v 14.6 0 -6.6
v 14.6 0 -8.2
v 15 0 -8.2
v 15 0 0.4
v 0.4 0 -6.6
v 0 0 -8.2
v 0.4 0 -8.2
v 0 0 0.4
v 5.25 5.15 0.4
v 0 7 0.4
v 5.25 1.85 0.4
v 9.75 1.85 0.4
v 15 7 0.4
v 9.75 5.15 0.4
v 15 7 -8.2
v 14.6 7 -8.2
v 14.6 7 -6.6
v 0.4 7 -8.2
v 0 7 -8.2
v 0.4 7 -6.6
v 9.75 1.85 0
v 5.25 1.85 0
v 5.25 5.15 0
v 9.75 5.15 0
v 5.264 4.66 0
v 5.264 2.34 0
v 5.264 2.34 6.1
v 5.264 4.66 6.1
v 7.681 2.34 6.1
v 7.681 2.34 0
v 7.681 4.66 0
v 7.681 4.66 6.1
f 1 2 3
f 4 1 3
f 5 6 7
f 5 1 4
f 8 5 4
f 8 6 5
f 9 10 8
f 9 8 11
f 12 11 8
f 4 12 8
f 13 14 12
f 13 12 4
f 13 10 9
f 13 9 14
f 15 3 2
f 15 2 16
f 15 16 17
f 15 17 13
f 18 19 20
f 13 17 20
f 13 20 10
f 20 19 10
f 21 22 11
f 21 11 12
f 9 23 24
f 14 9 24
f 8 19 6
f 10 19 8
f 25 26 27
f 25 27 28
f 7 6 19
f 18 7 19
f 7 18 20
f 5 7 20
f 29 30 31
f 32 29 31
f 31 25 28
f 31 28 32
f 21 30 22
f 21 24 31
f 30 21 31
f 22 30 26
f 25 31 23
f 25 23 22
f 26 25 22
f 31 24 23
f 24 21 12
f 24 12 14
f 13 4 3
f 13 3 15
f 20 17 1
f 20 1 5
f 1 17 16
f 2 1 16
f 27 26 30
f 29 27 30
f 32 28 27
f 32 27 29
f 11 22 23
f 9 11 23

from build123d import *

# Parameters (mm, degrees)
SKETCH_1_W      = 15
SKETCH_1_H      = 7
SKETCH_1_W_2    = 4.5
SKETCH_1_H_2    = 3.3
EXTRUDE_1_DEPTH = 0.4
SKETCH_2_W      = 15
SKETCH_2_H      = 7
EXTRUDE_2_DEPTH = 6.6
SKETCH_3_W      = 8.6
SKETCH_3_H      = 7
EXTRUDE_3_DEPTH = 0.4
SKETCH_4_W      = 8.6
SKETCH_4_H      = 7
EXTRUDE_4_DEPTH = 0.4
SKETCH_5_W      = 2.417347104
SKETCH_5_H      = 2.320372832
EXTRUDE_5_DEPTH = 6.1


with BuildPart() as part:
    # Эскиз1 → Бобышка-Вытянуть1 (new body)
    with BuildSketch(Plane.XY):
        with Locations((7.5, 3.5)):
            Rectangle(SKETCH_1_W, SKETCH_1_H)
        with Locations((7.5, 3.5)):
            Rectangle(SKETCH_1_W_2, SKETCH_1_H_2, mode=Mode.SUBTRACT)
    extrude(amount=EXTRUDE_1_DEPTH)

    # Эскиз2 → Бобышка-Вытянуть2 (add)
    with BuildSketch(Plane(origin=(0, 0, 0), x_dir=(-1, 0, 0), z_dir=(0, 0, -1))):
        with Locations((-7.5, 3.5)):
            Rectangle(SKETCH_2_W, SKETCH_2_H)
    extrude(amount=EXTRUDE_2_DEPTH)

    # Эскиз3 → Бобышка-Вытянуть3 (add)
    with BuildSketch(Plane(origin=(15, 0, 0), x_dir=(0, 0, -1), z_dir=(1, 0, 0))):
        with Locations((3.9, 3.5)):
            Rectangle(SKETCH_3_W, SKETCH_3_H)
    extrude(amount=-EXTRUDE_3_DEPTH)

    # Эскиз4 → Бобышка-Вытянуть4 (add)
    with BuildSketch(Plane.ZY):
        with Locations((-3.9, 3.5)):
            Rectangle(SKETCH_4_W, SKETCH_4_H)
    extrude(amount=-EXTRUDE_4_DEPTH)

    # Эскиз5 → Бобышка-Вытянуть5 (add)
    with BuildSketch(Plane.XY):
        with Locations((6.472493098, 3.5)):
            Rectangle(SKETCH_5_W, SKETCH_5_H)
    extrude(amount=EXTRUDE_5_DEPTH)


solid = part.part
